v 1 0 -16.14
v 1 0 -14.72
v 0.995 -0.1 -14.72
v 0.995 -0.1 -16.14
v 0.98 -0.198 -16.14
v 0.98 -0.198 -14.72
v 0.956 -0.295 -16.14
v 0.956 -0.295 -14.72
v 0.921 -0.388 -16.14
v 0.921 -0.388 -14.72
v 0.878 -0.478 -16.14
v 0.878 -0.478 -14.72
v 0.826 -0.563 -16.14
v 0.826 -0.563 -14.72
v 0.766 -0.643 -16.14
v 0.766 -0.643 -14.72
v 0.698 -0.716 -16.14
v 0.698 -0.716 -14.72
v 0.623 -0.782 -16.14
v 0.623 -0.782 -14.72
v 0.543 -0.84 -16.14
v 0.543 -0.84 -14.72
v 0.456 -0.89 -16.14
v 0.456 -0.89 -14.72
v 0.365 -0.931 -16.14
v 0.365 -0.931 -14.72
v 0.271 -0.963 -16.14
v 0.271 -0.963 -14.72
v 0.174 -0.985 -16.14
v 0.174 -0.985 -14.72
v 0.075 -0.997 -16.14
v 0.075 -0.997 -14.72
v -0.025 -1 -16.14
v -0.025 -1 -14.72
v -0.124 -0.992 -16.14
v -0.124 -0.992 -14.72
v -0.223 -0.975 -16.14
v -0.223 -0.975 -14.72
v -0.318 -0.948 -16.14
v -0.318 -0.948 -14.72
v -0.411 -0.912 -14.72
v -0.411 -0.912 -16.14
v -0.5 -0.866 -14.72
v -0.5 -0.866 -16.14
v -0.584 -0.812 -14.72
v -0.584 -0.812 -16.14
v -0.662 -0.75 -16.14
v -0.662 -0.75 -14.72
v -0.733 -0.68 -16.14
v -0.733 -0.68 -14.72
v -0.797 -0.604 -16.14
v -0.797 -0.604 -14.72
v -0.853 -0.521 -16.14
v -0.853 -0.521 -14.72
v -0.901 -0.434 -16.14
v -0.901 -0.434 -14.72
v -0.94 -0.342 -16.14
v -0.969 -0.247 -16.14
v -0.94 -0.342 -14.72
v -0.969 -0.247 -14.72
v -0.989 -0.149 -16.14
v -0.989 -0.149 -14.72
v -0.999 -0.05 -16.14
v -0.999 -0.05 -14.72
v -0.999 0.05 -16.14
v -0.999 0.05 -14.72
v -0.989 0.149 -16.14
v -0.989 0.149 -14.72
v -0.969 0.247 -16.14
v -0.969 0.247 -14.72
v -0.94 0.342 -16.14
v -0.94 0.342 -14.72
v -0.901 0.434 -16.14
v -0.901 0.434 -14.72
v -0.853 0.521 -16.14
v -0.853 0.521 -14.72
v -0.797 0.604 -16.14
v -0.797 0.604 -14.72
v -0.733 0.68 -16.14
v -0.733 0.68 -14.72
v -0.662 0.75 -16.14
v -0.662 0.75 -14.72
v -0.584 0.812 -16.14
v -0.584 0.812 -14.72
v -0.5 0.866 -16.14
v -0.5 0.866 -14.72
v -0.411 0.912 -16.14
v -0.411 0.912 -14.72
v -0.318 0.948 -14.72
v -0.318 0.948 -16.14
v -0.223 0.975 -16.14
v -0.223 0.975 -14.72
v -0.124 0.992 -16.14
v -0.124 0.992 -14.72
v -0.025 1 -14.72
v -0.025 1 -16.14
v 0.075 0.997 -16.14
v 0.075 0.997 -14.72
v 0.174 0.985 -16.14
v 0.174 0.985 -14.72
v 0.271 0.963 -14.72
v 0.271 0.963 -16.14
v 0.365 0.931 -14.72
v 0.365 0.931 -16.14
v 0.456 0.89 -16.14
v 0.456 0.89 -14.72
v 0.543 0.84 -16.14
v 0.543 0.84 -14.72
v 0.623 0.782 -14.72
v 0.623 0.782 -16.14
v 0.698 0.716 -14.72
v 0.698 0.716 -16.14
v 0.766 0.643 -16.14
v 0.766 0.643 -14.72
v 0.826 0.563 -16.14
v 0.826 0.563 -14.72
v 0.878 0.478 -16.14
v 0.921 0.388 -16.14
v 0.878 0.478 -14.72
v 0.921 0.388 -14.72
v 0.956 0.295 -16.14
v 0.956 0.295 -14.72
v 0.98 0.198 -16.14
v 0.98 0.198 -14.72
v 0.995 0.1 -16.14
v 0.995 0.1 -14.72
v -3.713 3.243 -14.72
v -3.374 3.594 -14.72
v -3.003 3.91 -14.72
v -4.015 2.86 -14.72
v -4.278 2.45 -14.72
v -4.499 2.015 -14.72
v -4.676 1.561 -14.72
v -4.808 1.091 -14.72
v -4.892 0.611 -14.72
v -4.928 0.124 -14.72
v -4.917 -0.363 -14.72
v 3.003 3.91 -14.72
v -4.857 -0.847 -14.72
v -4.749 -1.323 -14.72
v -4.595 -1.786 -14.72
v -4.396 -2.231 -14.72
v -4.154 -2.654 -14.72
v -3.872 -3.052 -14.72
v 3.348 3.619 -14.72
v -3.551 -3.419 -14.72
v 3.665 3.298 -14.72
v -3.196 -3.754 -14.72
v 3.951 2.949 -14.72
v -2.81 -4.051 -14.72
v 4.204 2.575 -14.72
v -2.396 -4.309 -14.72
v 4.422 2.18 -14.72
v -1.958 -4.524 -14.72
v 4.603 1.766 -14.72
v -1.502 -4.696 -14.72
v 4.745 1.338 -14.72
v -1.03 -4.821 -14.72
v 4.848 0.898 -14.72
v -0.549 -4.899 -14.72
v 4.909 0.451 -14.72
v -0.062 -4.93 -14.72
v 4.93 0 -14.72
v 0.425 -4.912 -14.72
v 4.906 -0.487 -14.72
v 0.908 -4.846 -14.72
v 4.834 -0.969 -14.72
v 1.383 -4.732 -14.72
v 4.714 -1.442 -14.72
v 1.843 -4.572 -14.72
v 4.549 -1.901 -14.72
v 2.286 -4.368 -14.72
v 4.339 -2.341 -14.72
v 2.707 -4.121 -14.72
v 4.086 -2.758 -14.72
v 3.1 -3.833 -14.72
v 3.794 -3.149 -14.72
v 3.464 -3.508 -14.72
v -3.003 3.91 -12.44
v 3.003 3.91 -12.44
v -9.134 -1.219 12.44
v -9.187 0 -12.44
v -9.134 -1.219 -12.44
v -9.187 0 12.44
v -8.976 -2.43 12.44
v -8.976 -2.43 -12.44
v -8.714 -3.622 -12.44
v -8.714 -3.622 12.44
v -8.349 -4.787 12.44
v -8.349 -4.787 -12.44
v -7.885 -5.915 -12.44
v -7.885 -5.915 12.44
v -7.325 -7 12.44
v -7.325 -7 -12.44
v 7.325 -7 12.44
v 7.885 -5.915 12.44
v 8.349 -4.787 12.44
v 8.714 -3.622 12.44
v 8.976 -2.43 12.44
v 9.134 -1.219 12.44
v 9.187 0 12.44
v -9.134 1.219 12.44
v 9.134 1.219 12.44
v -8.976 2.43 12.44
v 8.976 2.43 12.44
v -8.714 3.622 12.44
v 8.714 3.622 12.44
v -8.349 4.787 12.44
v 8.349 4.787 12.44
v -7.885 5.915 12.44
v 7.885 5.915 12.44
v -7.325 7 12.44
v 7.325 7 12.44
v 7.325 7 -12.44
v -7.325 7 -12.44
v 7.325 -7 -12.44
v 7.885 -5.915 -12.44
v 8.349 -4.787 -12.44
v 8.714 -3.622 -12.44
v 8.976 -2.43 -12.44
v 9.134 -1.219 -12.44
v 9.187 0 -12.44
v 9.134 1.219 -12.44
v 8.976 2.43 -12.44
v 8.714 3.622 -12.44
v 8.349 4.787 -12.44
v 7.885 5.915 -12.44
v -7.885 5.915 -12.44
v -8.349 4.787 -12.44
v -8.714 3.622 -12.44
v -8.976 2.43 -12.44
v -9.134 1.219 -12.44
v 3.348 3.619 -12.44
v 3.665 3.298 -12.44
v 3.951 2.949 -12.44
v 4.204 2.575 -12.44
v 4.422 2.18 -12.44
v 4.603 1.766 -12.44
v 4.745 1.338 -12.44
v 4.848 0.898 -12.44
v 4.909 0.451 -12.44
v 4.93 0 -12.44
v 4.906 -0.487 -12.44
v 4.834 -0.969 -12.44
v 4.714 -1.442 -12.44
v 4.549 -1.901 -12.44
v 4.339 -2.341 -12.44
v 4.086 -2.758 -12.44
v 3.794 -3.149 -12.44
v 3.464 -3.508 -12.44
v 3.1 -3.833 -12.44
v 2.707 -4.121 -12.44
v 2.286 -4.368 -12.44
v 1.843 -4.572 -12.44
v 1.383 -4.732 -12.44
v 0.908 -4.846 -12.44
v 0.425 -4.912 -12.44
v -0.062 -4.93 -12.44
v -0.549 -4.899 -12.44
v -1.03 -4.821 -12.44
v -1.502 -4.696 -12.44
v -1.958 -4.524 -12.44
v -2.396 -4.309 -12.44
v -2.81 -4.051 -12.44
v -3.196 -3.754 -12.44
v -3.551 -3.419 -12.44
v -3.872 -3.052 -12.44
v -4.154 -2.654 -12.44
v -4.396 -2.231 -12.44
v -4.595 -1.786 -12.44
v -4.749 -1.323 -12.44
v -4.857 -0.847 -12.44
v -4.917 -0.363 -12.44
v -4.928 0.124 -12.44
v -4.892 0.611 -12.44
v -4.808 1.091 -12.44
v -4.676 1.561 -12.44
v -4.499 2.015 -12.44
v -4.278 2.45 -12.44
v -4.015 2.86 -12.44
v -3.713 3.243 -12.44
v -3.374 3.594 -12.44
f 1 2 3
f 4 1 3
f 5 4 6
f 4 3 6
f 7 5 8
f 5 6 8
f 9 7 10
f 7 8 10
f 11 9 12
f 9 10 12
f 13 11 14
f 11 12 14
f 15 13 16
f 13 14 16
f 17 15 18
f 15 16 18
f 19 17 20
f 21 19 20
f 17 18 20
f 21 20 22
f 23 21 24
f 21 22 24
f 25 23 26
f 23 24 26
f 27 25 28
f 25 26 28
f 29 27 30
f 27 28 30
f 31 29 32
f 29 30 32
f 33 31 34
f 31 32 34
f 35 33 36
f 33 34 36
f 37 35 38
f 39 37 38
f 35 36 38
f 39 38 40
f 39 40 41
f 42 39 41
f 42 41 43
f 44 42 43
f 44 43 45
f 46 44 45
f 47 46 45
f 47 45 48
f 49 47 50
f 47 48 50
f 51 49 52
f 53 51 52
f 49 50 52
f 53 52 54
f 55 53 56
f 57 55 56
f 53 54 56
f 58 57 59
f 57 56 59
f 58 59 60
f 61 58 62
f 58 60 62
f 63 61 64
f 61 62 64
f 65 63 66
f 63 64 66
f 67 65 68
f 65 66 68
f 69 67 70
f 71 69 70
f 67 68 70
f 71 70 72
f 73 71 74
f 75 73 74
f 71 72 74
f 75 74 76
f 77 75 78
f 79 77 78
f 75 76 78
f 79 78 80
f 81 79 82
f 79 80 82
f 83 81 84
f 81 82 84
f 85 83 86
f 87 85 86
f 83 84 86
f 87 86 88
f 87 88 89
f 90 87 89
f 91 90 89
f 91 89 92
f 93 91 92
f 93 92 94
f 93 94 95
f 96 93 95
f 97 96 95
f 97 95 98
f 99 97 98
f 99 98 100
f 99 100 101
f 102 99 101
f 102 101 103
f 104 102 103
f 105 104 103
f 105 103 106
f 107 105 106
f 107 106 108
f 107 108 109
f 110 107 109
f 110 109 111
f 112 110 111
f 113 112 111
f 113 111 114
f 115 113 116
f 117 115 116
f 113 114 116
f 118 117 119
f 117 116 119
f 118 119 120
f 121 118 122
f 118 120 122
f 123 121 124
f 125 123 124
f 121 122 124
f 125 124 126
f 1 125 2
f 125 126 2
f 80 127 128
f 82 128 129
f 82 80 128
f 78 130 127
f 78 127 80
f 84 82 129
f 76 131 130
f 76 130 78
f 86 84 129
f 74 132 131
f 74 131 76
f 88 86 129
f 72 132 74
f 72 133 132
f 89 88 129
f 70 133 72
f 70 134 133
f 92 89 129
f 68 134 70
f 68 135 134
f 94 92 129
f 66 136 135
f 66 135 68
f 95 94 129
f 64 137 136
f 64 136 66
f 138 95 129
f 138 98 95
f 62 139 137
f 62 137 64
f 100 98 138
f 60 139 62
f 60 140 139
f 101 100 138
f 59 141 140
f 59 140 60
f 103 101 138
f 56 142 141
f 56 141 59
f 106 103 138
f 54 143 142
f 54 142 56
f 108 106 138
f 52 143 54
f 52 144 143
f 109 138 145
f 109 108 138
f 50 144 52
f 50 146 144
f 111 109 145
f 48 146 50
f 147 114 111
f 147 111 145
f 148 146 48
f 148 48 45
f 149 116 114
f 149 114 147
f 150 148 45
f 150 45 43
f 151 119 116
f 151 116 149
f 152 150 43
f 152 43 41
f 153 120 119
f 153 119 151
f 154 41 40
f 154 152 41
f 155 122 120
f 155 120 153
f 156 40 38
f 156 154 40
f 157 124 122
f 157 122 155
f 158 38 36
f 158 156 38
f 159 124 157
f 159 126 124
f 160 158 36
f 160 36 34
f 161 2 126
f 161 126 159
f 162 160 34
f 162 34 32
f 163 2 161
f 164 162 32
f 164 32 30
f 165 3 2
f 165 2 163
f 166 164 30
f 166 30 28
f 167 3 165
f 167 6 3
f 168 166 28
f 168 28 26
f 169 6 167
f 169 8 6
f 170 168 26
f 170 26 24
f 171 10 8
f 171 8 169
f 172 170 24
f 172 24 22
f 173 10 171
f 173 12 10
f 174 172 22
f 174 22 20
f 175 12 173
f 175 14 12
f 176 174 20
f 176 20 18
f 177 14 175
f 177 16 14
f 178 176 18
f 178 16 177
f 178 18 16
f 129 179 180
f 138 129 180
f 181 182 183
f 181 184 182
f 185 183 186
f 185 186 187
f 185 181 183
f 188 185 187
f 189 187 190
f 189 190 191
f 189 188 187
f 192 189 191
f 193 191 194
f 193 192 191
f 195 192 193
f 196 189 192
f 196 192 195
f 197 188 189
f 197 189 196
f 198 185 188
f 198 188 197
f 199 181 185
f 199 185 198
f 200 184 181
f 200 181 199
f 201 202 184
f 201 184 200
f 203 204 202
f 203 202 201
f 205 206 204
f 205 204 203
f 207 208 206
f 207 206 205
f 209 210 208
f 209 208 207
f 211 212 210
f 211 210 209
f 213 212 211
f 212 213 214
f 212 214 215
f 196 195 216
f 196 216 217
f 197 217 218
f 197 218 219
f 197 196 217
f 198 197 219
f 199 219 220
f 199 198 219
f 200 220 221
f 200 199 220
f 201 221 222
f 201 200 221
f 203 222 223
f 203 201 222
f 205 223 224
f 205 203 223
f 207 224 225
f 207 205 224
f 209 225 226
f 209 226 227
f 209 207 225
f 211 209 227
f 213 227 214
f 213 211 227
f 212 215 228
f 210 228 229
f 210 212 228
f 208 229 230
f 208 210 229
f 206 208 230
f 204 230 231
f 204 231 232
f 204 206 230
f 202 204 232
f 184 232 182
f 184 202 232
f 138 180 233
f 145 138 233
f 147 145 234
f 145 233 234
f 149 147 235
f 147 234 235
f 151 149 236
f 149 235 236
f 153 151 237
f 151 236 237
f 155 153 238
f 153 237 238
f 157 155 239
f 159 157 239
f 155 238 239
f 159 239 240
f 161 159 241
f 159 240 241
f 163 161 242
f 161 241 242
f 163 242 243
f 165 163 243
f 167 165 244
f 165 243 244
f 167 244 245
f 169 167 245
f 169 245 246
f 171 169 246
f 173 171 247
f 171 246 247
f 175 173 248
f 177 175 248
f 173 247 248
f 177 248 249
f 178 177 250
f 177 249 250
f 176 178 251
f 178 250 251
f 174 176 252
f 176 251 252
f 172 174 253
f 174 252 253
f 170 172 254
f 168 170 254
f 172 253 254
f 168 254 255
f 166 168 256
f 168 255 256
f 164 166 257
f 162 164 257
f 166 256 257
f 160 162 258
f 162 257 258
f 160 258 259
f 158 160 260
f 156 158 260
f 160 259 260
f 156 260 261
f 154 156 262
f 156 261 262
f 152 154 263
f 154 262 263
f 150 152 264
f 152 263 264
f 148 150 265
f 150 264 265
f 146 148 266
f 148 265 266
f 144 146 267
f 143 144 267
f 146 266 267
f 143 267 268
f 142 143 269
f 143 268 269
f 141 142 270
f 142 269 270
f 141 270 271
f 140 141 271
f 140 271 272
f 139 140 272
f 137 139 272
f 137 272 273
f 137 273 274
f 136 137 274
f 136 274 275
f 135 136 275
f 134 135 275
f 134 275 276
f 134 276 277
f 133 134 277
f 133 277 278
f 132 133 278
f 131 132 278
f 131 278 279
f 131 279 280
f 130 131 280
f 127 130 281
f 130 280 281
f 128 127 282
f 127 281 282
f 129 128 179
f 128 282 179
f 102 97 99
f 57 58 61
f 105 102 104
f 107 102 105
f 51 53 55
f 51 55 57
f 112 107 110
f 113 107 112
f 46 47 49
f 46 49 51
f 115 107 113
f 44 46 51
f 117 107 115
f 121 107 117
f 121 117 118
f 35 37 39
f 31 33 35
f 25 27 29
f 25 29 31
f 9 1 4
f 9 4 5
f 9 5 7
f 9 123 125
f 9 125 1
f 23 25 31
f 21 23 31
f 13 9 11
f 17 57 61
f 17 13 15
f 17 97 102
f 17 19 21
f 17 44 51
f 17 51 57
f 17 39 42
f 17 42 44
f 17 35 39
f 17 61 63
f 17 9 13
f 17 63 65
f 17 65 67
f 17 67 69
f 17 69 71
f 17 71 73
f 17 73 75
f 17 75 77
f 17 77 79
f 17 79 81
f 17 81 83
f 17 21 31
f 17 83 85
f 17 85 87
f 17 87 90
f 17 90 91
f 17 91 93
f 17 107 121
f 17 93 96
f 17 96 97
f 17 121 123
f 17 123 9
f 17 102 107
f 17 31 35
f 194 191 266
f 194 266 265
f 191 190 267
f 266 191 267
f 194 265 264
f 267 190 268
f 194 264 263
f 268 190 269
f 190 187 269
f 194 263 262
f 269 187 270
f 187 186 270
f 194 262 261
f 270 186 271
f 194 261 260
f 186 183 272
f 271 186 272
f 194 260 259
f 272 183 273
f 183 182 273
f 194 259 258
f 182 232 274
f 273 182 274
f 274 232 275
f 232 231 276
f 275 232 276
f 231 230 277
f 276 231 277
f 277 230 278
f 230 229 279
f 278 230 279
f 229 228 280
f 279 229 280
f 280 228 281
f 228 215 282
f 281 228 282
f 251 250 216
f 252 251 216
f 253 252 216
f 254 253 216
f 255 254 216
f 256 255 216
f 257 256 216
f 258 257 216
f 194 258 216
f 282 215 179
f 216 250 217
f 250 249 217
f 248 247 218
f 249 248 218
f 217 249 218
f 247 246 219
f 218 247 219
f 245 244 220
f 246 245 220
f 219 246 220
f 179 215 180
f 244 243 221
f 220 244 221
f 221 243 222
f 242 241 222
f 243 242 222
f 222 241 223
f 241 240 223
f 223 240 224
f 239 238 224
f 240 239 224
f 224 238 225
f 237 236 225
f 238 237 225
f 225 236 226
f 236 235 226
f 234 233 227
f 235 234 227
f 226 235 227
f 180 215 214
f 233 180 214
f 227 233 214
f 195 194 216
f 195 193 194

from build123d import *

# Parameters (mm, degrees)
F1_DEPTH = 12.44
F3_DEPTH = 2.28
F4_R     = 1
F5_DEPTH = 1.42


with BuildPart() as f1:
    # F0 (on Top) → F1 (new body, symmetric)
    with BuildSketch(Plane.XY):
        with BuildLine():
            Line((-7.3253149017, -7), (7.3253149017, -7))
            ThreePointArc((7.3253149017, -7), (8.7137955042, -3.6216957288), (9.1872278446, 0))
            ThreePointArc((9.1872278446, 0), (8.7137955042, 3.6216957288), (7.3253149017, 7))
            Line((7.3253149017, 7), (-7.3253149017, 7))
            ThreePointArc((-7.3253149017, 7), (-8.7137955052, 3.6216957251), (-9.1872278446, -7.5e-09))
            ThreePointArc((-9.1872278446, -7.5e-09), (-8.7137955032, -3.6216957324), (-7.3253149017, -7))
        make_face()
    extrude(amount=F1_DEPTH, both=True)

    # F2 (on face) → F3 (join)
    with BuildSketch(Plane(origin=(0, 0, -12.44), x_dir=(1, 0, 0), z_dir=(0, 0, -1))):
        with BuildLine():
            ThreePointArc((3.0027986946, -3.91), (4.4220299391, -2.1795759262), (4.93, 0))
            ThreePointArc((4.93, 0), (-2.1795759262, 4.4220299391), (-3.0027986946, -3.91))
            Line((-3.0027986946, -3.91), (3.0027986946, -3.91))
        make_face()
    extrude(amount=F3_DEPTH)

    # F4 (on face) → F5 (join)
    with BuildSketch(Plane(origin=(0, 0, -14.72), x_dir=(1, 0, 0), z_dir=(0, 0, -1))):
        Circle(F4_R)
    extrude(amount=F5_DEPTH)


solid = f1.part
